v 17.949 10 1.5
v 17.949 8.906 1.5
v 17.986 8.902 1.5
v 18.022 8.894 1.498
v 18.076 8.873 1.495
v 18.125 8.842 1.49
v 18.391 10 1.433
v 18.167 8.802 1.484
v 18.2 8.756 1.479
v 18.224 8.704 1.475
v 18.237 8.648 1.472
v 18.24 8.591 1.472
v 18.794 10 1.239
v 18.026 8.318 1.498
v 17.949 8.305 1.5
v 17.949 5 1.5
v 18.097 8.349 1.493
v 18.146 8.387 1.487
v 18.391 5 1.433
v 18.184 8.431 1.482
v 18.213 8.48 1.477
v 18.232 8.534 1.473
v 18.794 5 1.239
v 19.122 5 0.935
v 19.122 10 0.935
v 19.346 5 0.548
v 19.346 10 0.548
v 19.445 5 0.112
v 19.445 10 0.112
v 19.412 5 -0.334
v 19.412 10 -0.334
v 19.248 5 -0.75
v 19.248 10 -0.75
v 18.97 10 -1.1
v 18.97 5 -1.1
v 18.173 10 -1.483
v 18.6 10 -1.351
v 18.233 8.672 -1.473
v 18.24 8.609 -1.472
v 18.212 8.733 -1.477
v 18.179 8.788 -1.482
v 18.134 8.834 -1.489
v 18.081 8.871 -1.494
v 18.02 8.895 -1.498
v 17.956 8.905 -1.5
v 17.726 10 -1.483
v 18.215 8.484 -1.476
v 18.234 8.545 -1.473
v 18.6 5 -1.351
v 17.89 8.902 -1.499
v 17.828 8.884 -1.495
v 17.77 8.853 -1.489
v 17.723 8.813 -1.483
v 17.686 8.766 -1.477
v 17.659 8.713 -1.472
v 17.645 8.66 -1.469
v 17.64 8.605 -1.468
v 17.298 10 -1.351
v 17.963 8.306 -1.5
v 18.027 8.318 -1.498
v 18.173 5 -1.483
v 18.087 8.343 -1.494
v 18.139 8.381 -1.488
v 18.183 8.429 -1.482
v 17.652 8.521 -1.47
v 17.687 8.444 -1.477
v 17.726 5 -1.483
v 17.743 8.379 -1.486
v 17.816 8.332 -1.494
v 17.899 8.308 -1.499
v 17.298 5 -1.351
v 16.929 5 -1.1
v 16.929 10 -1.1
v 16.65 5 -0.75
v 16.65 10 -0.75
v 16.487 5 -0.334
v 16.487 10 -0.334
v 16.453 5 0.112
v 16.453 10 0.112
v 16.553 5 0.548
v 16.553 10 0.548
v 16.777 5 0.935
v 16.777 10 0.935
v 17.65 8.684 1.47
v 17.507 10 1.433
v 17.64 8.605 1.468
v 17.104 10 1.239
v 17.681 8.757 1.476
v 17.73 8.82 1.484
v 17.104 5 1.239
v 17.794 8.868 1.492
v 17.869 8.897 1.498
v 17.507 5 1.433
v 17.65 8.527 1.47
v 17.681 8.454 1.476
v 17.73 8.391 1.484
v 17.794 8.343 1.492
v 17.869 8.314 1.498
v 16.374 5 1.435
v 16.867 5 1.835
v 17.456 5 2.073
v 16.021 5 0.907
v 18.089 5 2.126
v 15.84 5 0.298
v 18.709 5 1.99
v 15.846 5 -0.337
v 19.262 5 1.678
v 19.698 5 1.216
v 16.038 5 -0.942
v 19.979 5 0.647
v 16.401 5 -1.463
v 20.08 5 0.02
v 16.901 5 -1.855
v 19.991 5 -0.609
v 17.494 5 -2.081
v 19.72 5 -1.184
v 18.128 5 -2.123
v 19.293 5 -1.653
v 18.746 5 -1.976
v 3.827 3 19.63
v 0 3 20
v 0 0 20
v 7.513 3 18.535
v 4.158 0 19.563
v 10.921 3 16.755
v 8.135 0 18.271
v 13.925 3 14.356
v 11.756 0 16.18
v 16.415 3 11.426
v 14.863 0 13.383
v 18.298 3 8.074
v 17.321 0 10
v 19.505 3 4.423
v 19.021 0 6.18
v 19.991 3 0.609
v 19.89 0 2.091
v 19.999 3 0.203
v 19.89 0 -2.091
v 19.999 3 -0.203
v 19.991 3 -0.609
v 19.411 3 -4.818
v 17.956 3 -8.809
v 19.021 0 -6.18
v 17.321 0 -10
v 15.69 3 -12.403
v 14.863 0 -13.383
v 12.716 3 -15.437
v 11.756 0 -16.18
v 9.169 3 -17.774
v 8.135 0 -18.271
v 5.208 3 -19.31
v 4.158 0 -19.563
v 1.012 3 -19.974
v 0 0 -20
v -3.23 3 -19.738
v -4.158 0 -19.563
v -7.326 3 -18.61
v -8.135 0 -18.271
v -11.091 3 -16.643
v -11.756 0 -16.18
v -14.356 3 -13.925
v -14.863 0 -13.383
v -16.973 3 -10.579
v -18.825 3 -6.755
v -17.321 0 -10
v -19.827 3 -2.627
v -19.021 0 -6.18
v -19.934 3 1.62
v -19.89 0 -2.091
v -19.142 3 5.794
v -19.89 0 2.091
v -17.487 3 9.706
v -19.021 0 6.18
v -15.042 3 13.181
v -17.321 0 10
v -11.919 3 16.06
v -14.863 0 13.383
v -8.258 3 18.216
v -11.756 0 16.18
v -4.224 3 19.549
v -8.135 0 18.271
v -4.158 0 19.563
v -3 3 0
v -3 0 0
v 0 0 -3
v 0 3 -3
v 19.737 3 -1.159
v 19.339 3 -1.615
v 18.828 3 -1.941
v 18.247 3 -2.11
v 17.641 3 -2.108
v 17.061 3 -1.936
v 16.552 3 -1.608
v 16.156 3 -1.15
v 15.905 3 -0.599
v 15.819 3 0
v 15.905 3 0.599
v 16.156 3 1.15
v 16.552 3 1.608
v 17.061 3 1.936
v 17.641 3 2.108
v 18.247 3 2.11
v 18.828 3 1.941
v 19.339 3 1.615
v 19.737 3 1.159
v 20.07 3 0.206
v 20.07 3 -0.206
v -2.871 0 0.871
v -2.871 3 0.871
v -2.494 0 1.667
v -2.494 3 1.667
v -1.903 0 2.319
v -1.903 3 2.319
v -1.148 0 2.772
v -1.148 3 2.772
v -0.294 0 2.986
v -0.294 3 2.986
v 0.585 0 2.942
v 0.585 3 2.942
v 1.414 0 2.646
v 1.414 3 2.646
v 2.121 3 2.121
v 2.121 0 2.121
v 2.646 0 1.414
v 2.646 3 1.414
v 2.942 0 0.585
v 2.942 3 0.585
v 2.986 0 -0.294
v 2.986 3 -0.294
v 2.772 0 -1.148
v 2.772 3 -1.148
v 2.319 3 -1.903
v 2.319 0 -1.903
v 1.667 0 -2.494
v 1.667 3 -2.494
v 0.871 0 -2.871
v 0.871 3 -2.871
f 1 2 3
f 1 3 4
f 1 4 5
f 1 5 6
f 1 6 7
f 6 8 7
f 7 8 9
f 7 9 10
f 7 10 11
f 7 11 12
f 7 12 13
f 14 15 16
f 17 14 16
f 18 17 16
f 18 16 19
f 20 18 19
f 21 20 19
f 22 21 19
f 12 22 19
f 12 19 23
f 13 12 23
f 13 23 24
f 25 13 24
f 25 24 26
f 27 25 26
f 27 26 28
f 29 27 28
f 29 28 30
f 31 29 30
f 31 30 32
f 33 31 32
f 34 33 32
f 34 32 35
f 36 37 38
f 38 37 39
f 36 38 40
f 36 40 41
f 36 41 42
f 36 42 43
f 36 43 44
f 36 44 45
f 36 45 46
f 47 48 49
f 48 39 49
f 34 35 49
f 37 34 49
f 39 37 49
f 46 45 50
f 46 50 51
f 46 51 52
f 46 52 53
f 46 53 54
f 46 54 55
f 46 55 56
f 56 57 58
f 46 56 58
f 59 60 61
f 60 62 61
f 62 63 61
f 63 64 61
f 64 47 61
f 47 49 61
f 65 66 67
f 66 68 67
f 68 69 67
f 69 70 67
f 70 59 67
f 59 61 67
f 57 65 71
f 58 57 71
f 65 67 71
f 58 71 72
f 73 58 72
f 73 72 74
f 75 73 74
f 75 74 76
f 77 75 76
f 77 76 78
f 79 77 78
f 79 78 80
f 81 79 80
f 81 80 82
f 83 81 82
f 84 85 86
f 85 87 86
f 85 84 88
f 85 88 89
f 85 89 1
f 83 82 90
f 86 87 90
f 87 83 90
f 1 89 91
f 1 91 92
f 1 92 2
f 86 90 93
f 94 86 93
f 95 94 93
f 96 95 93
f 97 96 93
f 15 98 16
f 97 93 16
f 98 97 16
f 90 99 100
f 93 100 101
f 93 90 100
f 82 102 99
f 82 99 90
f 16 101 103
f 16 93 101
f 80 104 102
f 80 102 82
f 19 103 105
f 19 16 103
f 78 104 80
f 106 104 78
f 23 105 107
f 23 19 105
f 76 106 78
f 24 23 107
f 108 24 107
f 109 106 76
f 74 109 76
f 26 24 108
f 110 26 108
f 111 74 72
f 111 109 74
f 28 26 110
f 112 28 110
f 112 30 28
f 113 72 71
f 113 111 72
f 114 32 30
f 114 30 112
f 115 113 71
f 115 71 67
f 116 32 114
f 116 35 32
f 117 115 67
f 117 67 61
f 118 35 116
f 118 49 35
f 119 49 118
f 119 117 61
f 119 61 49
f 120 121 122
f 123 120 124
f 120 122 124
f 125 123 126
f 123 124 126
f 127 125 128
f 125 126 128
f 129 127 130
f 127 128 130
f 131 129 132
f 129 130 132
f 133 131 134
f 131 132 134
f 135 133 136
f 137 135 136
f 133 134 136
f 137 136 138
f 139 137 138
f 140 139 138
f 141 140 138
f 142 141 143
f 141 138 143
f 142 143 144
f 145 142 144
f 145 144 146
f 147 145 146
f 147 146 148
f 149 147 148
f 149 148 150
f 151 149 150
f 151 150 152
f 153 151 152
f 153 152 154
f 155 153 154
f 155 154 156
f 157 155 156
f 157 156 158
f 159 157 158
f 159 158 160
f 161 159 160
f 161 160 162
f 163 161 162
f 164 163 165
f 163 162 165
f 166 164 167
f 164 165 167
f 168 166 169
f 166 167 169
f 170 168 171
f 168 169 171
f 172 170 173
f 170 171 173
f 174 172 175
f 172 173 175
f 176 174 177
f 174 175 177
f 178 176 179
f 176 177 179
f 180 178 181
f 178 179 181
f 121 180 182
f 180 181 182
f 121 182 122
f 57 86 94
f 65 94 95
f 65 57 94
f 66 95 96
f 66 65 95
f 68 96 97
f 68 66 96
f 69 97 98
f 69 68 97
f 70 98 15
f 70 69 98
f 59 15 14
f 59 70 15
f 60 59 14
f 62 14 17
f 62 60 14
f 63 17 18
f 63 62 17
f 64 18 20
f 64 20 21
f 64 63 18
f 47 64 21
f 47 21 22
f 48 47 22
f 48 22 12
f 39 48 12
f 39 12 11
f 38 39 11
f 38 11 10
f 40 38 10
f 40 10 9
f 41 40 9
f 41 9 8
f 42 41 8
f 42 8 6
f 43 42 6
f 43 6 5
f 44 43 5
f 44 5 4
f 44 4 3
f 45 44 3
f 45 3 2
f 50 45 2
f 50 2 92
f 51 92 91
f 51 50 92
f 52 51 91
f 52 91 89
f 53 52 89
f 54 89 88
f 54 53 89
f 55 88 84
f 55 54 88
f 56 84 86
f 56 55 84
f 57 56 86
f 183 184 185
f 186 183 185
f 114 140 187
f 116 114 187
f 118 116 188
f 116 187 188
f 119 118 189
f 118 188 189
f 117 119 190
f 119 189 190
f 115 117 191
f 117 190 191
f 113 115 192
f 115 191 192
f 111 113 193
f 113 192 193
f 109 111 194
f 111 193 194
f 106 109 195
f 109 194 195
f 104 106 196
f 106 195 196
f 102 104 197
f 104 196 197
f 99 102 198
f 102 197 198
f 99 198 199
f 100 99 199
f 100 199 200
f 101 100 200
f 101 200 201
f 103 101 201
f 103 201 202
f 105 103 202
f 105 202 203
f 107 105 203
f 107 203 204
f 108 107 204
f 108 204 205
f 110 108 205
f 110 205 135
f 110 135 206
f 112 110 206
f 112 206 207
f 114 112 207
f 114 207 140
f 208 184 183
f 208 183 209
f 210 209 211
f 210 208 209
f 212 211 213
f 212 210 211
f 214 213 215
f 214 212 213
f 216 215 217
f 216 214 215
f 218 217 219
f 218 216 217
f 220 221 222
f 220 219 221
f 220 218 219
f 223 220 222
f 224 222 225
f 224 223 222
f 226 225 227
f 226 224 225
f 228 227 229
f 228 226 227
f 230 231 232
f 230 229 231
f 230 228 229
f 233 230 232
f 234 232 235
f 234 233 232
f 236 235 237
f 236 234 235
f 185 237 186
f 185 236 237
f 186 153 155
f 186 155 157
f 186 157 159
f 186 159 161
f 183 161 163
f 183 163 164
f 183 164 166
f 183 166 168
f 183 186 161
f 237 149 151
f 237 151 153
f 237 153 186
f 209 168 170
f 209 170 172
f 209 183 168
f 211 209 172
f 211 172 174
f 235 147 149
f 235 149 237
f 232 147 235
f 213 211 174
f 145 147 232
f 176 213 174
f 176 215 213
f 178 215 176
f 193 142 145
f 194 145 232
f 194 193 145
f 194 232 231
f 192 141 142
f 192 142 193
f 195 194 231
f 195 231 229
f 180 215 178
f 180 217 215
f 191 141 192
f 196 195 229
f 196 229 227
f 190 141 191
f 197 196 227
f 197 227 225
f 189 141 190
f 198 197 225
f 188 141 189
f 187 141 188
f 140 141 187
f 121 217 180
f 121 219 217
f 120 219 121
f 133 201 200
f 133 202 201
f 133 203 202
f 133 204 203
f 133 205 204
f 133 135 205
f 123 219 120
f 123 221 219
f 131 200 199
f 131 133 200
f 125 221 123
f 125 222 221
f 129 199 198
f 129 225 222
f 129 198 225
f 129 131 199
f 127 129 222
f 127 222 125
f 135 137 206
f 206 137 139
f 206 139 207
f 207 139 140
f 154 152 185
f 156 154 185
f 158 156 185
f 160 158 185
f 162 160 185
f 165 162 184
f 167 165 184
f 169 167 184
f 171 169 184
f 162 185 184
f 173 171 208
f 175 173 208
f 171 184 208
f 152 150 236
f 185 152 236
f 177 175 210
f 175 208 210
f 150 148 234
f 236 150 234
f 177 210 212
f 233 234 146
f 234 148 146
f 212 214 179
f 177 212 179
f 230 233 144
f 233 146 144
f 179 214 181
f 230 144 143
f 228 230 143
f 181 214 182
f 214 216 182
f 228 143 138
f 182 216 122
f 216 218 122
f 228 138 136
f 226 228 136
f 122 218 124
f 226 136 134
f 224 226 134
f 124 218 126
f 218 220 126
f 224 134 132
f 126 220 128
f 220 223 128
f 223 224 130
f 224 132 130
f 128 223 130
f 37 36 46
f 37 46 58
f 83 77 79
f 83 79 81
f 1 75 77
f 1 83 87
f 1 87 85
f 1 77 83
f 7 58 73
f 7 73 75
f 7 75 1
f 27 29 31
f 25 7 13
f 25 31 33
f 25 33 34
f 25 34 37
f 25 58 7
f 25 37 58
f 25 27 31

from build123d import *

# Parameters (mm, degrees)
SKETCH2_R               = 20
SKETCH2_R_2             = 3
BOSS_EXTRUDE1_DEPTH     = 3
BOSS_EXTRUDE2_START     = 3
SKETCH5_R               = 1.5
BOSS_EXTRUDE2_DEPTH     = 7
CUT_EXTRUDE1_DEPTH      = 8
CUT_EXTRUDE1_DEPTH_BACK = 8
SKETCH6_R               = 0.300327284
BOSS_EXTRUDE3_DEPTH     = 3
SKETCH8_R               = 2.130430509
BOSS_EXTRUDE4_DEPTH     = 2


with BuildPart() as part:
    # Sketch2 → Boss-Extrude1 (new body)
    with BuildSketch(Plane(origin=(0, 0, 0), x_dir=(1, 0, 0), z_dir=(0, 1, 0))):
        with Locations(Location((0, 0, 0), (0, 0, 270))):
            Circle(SKETCH2_R)
        with Locations(Location((0, 0, 0), (0, 0, 270))):
            Circle(SKETCH2_R_2, mode=Mode.SUBTRACT)
    extrude(amount=BOSS_EXTRUDE1_DEPTH)

    # Sketch5 → Boss-Extrude2 (add)
    with BuildSketch(Plane(origin=(0, 0, 0), x_dir=(1, 0, 0), z_dir=(0, 1, 0)).offset(BOSS_EXTRUDE2_START)):
        with Locations(Location((17.949264284, 0, 0), (0, 0, 270))):
            Circle(SKETCH5_R)
    extrude(amount=BOSS_EXTRUDE2_DEPTH)

    # Sketch6 → Cut-Extrude1 (cut, two sides: drawn at the far end of the back side and taken through both)
    with BuildSketch(Plane.XY.offset(-CUT_EXTRUDE1_DEPTH_BACK)):
        with Locations(Location((17.939875417, 8.605457477, 0), (0, 0, 180))):
            Circle(SKETCH6_R)
    extrude(amount=CUT_EXTRUDE1_DEPTH + CUT_EXTRUDE1_DEPTH_BACK, mode=Mode.SUBTRACT)

    # Sketch7 → Boss-Extrude3 (add)
    with BuildSketch(Plane(origin=(0, 0, 0), x_dir=(1, 0, 0), z_dir=(0, 1, 0))):
        with BuildLine():
            Line((-3, 0), (0, 3))
            ThreePointArc((0, 3), (-2.121320344, 2.121320344), (-3, 0))
        make_face()
    extrude(amount=BOSS_EXTRUDE3_DEPTH)

    # Sketch8 → Boss-Extrude4 (add)
    with BuildSketch(Plane(origin=(0, 3, 0), x_dir=(1, 0, 0), z_dir=(0, 1, 0))):
        with Locations(Location((17.949264284, 0, 0), (0, 0, 16.617512863))):
            Circle(SKETCH8_R)
    extrude(amount=BOSS_EXTRUDE4_DEPTH)


solid = part.part
